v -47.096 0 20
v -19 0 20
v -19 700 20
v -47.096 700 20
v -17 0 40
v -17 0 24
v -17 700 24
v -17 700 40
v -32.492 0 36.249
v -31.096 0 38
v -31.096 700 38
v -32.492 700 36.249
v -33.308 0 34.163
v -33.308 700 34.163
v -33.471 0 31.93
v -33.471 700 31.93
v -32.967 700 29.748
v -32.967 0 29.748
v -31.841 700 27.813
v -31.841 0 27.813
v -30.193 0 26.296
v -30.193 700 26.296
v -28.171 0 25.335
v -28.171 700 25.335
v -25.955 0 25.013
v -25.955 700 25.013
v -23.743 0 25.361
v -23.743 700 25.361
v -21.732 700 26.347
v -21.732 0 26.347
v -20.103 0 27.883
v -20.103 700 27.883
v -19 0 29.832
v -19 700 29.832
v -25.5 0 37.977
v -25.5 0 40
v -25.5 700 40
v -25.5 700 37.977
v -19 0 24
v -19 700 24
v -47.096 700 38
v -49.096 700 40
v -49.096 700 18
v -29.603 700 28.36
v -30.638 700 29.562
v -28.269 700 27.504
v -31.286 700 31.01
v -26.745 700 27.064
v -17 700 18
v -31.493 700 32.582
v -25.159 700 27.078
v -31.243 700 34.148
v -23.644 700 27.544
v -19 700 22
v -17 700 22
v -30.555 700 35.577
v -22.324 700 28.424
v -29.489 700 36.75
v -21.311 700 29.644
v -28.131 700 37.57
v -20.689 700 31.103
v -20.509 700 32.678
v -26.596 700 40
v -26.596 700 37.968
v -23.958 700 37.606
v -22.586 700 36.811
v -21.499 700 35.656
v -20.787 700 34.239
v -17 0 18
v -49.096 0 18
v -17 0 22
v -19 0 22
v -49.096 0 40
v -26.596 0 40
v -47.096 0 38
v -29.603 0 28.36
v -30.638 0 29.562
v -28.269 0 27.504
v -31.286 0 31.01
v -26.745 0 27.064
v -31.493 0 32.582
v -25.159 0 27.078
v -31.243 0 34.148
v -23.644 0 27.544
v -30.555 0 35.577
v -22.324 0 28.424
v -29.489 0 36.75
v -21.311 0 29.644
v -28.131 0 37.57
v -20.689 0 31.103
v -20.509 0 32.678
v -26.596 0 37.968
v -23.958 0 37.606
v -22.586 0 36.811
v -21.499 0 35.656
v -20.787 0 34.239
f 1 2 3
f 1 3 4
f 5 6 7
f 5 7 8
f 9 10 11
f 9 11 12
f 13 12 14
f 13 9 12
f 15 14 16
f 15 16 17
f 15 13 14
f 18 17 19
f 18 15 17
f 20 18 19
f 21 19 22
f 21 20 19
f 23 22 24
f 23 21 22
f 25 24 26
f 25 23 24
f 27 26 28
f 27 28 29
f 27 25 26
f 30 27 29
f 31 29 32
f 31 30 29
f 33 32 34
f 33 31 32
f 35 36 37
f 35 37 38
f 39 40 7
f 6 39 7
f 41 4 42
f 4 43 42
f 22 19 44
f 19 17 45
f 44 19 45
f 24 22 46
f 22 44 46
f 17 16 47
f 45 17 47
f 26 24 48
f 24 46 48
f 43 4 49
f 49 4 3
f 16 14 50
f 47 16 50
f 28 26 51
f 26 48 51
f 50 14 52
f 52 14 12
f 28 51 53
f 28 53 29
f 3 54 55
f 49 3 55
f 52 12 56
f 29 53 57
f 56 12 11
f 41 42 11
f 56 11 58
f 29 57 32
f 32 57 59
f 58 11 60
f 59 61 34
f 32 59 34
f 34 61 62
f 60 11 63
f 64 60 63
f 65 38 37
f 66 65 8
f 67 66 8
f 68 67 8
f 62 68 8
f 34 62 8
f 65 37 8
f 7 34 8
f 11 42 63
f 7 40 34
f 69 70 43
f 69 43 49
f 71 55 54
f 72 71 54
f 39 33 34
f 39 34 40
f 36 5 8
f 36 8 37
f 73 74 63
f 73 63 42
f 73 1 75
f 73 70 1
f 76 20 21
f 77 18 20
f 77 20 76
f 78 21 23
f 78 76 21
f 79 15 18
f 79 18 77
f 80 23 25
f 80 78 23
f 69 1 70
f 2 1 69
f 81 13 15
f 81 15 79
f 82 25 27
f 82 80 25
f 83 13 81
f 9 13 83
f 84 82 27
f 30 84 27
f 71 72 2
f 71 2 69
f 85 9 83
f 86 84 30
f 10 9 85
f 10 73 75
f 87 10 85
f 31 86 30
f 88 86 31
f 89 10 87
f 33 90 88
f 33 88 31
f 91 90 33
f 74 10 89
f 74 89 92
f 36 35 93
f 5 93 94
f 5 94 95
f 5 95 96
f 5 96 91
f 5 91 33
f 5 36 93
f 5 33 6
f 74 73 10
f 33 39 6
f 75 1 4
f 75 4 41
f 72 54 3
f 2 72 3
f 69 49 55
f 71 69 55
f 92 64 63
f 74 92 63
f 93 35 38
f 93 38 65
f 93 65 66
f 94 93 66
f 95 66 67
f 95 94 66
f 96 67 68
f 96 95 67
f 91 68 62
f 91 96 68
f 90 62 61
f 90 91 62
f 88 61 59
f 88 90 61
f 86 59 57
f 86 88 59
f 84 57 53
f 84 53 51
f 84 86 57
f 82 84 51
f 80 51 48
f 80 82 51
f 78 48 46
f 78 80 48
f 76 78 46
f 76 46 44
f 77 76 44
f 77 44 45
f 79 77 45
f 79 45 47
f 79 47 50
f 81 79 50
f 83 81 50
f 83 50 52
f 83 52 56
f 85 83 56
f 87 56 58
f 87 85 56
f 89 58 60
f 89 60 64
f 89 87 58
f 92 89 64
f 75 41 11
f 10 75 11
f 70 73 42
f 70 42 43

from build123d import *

# Parameters (mm, degrees)
F2_DEPTH = 1910
F7_DEPTH = 700
F9_DEPTH = 2000


with BuildPart() as f2:
    # F1 (on Front) → F2 (new body)
    with BuildSketch(Plane.XZ):
        with BuildLine():
            Line((7.5, 37.974085065), (7.5, 40))
            Line((7.5, 40), (-15, 40))
            Line((-15, 40), (-15, 37))
            Line((-15, 37), (-15, 31))
            Line((-15, 31), (-15, 29))
            Line((-15, 29), (-15, 26))
            Line((-15, 26), (-15, 24))
            Line((-15, 24), (-13, 24))
            Line((-13, 24), (-11, 24))
            Line((-11, 24), (-11, 26))
            Line((-11, 26), (-9, 26))
            Line((-9, 26), (-9, 20))
            Line((-9, 20), (-11, 20))
            Line((-11, 20), (-11, 22))
            Line((-11, 22), (-15, 22))
            Line((-15, 22), (-15, 18))
            Line((-15, 18), (-15, 7.7))
            Line((-15, 7.7), (-13, 7.7))
            Line((-13, 7.7), (-13, 11.4920835048))
            Line((-13, 11.4920835048), (-7, 11.4920835048))
            Line((-7, 11.4920835048), (-7, 3.7))
            Line((-7, 3.7), (-11, 3.7))
            Line((-11, 3.7), (-11, 5.7))
            Line((-11, 5.7), (-15, 5.7))
            Line((-15, 5.7), (-15, 3))
            Line((-15, 3), (-15, 0))
            Line((-15, 0), (-13, 0))
            Line((-13, 0), (-12, 0))
            Line((-12, 0), (-5, 0))
            Line((-5, 0), (-5, 13.4920835048))
            Line((-5, 13.4920835048), (-7, 13.4920835048))
            Line((-7, 13.4920835048), (-9.1588944197, 13.4920835048))
            Line((-9.1588944197, 13.4920835048), (-9.1588944197, 15.4920835048))
            Line((-9.1588944197, 15.4920835048), (1.5, 20))
            Line((1.5, 20), (10.8411055803, 15.4920835048))
            Line((10.8411055803, 15.4920835048), (10.8411055803, 13.4920835048))
            Line((10.8411055803, 13.4920835048), (8, 13.4920835048))
            Line((8, 13.4920835048), (8, 0))
            Line((8, 0), (17, 0))
            Line((17, 0), (17, 40))
            Line((17, 40), (8.5, 40))
            Line((8.5, 40), (8.5, 37.974085065))
            ThreePointArc((8.5, 37.974085065), (11.5604089792, 36.6859489396), (13.3185590744, 33.8691589154))
            Line((13.3185590744, 33.8691589154), (13.4318527537, 31.7073867348))
            ThreePointArc((13.4318527537, 31.7073867348), (4.0126863822, 28.7323088758), (7.5, 37.974085065))
        make_face()
        Polygon((-8.3634709733, 18), (-11.1588944197, 16.817744602), (-11.1588944197, 15.4920835048), (-11.1588944197, 13.4920835048), (-13, 13.4920835048), (-13, 18), align=None, mode=Mode.SUBTRACT)
        with BuildLine():
            Line((-13, 34), (-13, 37.9999987781))
            Line((-13, 37.9999987781), (2.9081163149, 37.9999987781))
            ThreePointArc((2.9081163149, 37.9999987781), (3.810445381, 26.2974906682), (15, 29.8410427327))
            Line((15, 29.8410427327), (15, 2))
            Line((15, 2), (10, 2))
            Line((10, 2), (10, 12))
            Line((10, 12), (12.8411055803, 12))
            Line((12.8411055803, 12), (12.8411055803, 16.7476188273))
            Line((12.8411055803, 16.7476188273), (1.5543358685, 22.194491783))
            Line((1.5543358685, 22.194491783), (-7, 18.5766464184))
            Line((-7, 18.5766464184), (-7, 28))
            Line((-7, 28), (-13, 28))
            Line((-13, 28), (-13, 34))
        make_face(mode=Mode.SUBTRACT)
        with BuildLine():
            Line((13.0918836851, 37.9999987781), (13.1020709306, 37.9999987781))
            Line((13.1020709306, 37.9999987781), (13.1025921338, 37.9900536295))
            ThreePointArc((13.1025921338, 37.9900536295), (13.0972403349, 37.9950288154), (13.0918836851, 37.9999987781))
        make_face(mode=Mode.SUBTRACT)
    extrude(amount=-F2_DEPTH)

    # F8 (on face) → F9 (cut)
    with BuildSketch(Plane.XZ):
        Polygon((17, 0), (17, 40), (-15, 40), (-15, 3), (-15, 0), align=None)
    extrude(amount=-F9_DEPTH, mode=Mode.SUBTRACT)


with BuildPart() as f7:
    # F6 (on face) → F7 (new body)
    with BuildSketch(Plane.XZ):
        with BuildLine():
            ThreePointArc((-25.5, 37.9771982231), (-25.951759356, 27.0133522571), (-26.596, 37.9675733099))
            Line((-26.596, 37.9675733099), (-26.596, 40))
            Line((-26.596, 40), (-49.096, 40))
            Line((-49.096, 40), (-49.096, 18))
            Line((-49.096, 18), (-17, 18))
            Line((-17, 18), (-17, 22))
            Line((-17, 22), (-19, 22))
            Line((-19, 22), (-19, 20))
            Line((-19, 20), (-47.096, 20))
            Line((-47.096, 20), (-47.096, 38))
            Line((-47.096, 38), (-31.0964418097, 38))
            ThreePointArc((-31.0964418097, 38), (-30.1932729017, 26.2962600635), (-19, 29.8323432536))
            Line((-19, 29.8323432536), (-19, 24))
            Line((-19, 24), (-17, 24))
            Line((-17, 24), (-17, 40))
            Line((-17, 40), (-25.5, 40))
            Line((-25.5, 40), (-25.5, 37.9771982231))
        make_face()
    extrude(amount=-F7_DEPTH)


solid = f7.part
